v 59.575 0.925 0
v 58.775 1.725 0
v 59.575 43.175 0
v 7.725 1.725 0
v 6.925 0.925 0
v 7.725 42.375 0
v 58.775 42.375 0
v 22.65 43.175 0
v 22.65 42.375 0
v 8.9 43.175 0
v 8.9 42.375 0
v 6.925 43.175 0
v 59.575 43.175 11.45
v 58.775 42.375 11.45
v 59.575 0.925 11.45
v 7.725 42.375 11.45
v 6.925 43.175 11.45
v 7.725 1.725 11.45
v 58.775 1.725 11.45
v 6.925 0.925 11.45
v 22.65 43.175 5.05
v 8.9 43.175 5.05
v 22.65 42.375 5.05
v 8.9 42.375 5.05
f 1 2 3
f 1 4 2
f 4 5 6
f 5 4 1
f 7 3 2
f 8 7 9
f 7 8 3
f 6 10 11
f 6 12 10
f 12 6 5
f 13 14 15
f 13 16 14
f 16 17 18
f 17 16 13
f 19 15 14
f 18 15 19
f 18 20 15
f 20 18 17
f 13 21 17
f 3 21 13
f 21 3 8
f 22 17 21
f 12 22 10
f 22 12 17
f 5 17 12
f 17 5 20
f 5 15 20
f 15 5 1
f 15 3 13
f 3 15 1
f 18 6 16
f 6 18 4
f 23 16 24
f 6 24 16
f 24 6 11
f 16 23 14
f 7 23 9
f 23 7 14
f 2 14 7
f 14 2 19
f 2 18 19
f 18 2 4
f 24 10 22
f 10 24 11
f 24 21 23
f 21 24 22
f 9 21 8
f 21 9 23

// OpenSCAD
// file: measurements/print_settings.scad
/**
 * The diameter of the nozzle, in millimeters.  No features narrower than this can be produced.
 */
nozzle_diameter = 0.4;

/**
 * The height of a layer, in millimeters.  No features shorter than this can be produced.
 */
layer_height = 0.2;

/**
 * Added to small features to combat rounding errors.
 */
fudge = 0.00001;

/**
 * Cut out of any concave corners to prevent pinching.
 */
concave_corner_cut_size = 3;
// file: calculations/pcb.scad
include <../measurements/corner.scad>;
include <../measurements/pcb.scad>;
include <../measurements/wall.scad>;
include <wall.scad>;

/**
 * The location of the left edge of the PCB, in millimeters.
 */
pcb_left = corner_radius + wall_surround + wall_tolerance + wall_thickness + wall_tolerance + pcb_xy_tolerance;

/**
 * The location of the bottom edge of the PCB, in millimeters.
 */
pcb_bottom = wall_surround + wall_tolerance + wall_thickness + wall_tolerance + pcb_xy_tolerance;

/**
 * The locations of the PCB retainer corner cuts, on the X and Y axes, in millimeters.
 */
pcb_retainer_corner_cut_locations = [
  [
    pcb_left - pcb_xy_tolerance - pcb_retainer_thickness / 2,
    pcb_bottom - pcb_xy_tolerance - pcb_retainer_thickness / 2,
  ],
  [
    pcb_left + pcb_width + pcb_xy_tolerance + pcb_retainer_thickness / 2,
    pcb_bottom - pcb_xy_tolerance - pcb_retainer_thickness / 2,
  ],
  [
    pcb_left - pcb_xy_tolerance - pcb_retainer_thickness / 2,
    pcb_bottom + pcb_height + pcb_xy_tolerance + pcb_retainer_thickness / 2,
  ],
  [
    pcb_left + pcb_width + pcb_xy_tolerance + pcb_retainer_thickness / 2,
    pcb_bottom + pcb_height + pcb_xy_tolerance + pcb_retainer_thickness / 2,
  ],
];
// file: measurements/infrared.scad
/**
 * The distance between the left edge of the PCB and the left edge of the infrared window.
 */
infrared_pcb_left = 0.925;

/**
 * The width of the infrared window, in millimeters.
 */
infrared_width = 13.5;

/**
 * The tolerance either side of the infrared window, in millimeters.
 */
infrared_tolerance = 0.125;
// file: calculations/wall.scad
include <../measurements/print_settings.scad>;
include <../measurements/wall.scad>;

/**
 * The thickness of the wall, in millimeters.
 */
wall_thickness = wall_thickness_nozzle_diameters * nozzle_diameter + fudge;

/**
 * The minimum amount of plastic surrounding the wall-retaining grooves in the front and back faces, in millimeters.
 */
wall_surround = wall_surround_nozzle_diameters * nozzle_diameter + fudge;
// file: measurements/wall.scad
/**
 * The thickness of the wall, in nozzle diameters.
 */
wall_thickness_nozzle_diameters = 2;

/**
 * The amount of tolerance around the wall in the grooves in the front and back faces, in millimeters.
 */
wall_tolerance = 0.125;

/**
 * The minimum amount of plastic surrounding the wall-retaining grooves in the front and back faces, in nozzle diameters.
 */
wall_surround_nozzle_diameters = 2;

/**
 * The number of millimeters that the wall embeds into the front and back faces.
 */
wall_embed = 0.5;
// file: measurements/corner.scad
include <pcb.scad>;

/**
 * The radius of a corner, in millimeters.
 */
corner_radius = 6;

/**
 * The number of sides on a corner.
 */
corner_sides = 72;
// file: measurements/display.scad
/**
 * The distance between the left and right edges of the display's casing, in millimeters.
 */
display_width = 33.3;

/**
 * The distance between the top and bottom edges of the display's casing, in millimeters.
 */
display_height = 38.3;

/**
 * The distance between the (visible) front and (PCB-facing) back faces of the display's casing, ignoring the connector, in millimeters.
 */
display_thickness = 2;

/**
 * The distance between the left edge of the display's casing and the left edge of its viewable area, in millimeters.
 */
display_left_padding = 3.5;

/**
 * The distance between the right edge of the display's casing and the right edge of its viewable area, in millimeters.
 */
display_right_padding = 8.3;

/**
 * The distance between the top edge of the display's casing and the left top of its viewable area, in millimeters.
 */
display_top_padding = 4;

/**
 * The distance between the left edge of the display's casing and the bottom edge of its viewable area, in millimeters.
 */
display_bottom_padding = 4;

/**
 * The sizes of the radiuses of the corners of the shell's display cutout, in millimeters.
 */
display_radius_size = 2;

/**
 * The number of sides of each corner radius of the shell's display cutout.
 */
display_radius_sides = 16;

/**
 * The amount of margin on each side of the display's visible area, in millimeters; effectively expands the display by this amount in each direction.
 */
display_cutout_margin = 1;

/**
 * The amount of tolerance between each side of the display's casing and the retaining wall, in millimeters.
 */
display_xy_tolerance = 0.25;

/**
 * The thickness of the display retaining wall, in millimeters.
 */
display_wall_thickness = 0.6;

/**
 * The distance between the display's casing (ignoring the connector) and the PCB, in millimeters.
 */
display_pcb_distance = 2;

/**
 * The distance between the left edge of the display's casing and the left edge of the PCB, in millimeters.
 */
display_pcb_left = 0.8;

/**
 * The distance between the bottom edge of the display's casing and the bottom edge of the PCB, in millimeters.
 */
display_pcb_bottom = 0.8;

/**
 * The thickness of the front bezel, in millimeters.
 */
display_bezel_thickness = 1.4;

/**
 * The height of the display's connector.
 */
display_connector_height = 9;

/**
 * The width of the display's connector.
 */
display_connector_width = 1.45;

/**
 * The tolerance around the display's connector.
 */
display_connector_tolerance = 0.25;

/**
 * The distance between the right edge of the display and its connector.
 */
display_right_connector_right = 0.8;

/**
 * The distance between the bottom edge of the display and its connector.
 */
display_bottom_connector_bottom = 14.65;

/**
 * The thickness of the display's spacer.
 */
display_spacer_thickness = 1.2;
// file: modules/wall.scad
include <../measurements/infrared.scad>;
include <../measurements/pcb.scad>;
include <../measurements/wall.scad>;
include <../calculations/pcb.scad>;

module wall() {
  difference() {
    translate([
      pcb_left - pcb_xy_tolerance - wall_tolerance - wall_thickness,
      pcb_bottom - pcb_xy_tolerance - wall_tolerance - wall_thickness,
    ]) {
      square([
        wall_thickness + wall_tolerance + pcb_xy_tolerance + pcb_width + pcb_xy_tolerance + wall_tolerance + wall_thickness,
        wall_thickness + wall_tolerance + pcb_xy_tolerance + pcb_height + pcb_xy_tolerance + wall_tolerance + wall_thickness,
      ]);
    };

    translate([
      pcb_left - pcb_xy_tolerance - wall_tolerance,
      pcb_bottom - pcb_xy_tolerance - wall_tolerance,
    ]) {
      square([
        wall_tolerance + pcb_xy_tolerance + pcb_width + pcb_xy_tolerance + wall_tolerance,
        wall_tolerance + pcb_xy_tolerance + pcb_height + pcb_xy_tolerance + wall_tolerance,
      ]);
    };
  };
};
// file: modules/infrared_window_cutout.scad
include <../measurements/infrared.scad>;
include <../measurements/pcb.scad>;
include <../calculations/overall.scad>;
include <../calculations/pcb.scad>;

module infrared_window_cutout() {
  translate([
    pcb_left + infrared_pcb_left - infrared_tolerance,
    pcb_bottom + pcb_height / 2,
  ]) {
    square([infrared_width + infrared_tolerance * 2, overall_height]);
  };
}
// file: calculations/overall.scad
include <../measurements/corner.scad>;
include <../measurements/pcb.scad>;
include <../measurements/wall.scad>;
include <../measurements/display.scad>;
include <../measurements/plate.scad>;
include <wall.scad>;

/**
 * The width of the assembled device, in millimeters.
 */
overall_width = corner_radius + wall_surround + wall_tolerance + wall_thickness + wall_tolerance + pcb_xy_tolerance
  + pcb_width
  + pcb_xy_tolerance + wall_tolerance + wall_thickness + wall_tolerance + wall_surround + corner_radius;

/**
 * The height of the assembled device, in millimeters.
 */
overall_height = wall_surround + wall_tolerance + wall_thickness + wall_tolerance + pcb_xy_tolerance
  + pcb_height
  + pcb_xy_tolerance + wall_tolerance + wall_thickness + wall_tolerance + wall_surround;

/**
 * The depth of the assembled device, in millimeters.
 */
overall_depth = display_bezel_thickness + display_thickness + display_pcb_distance + pcb_z_tolerance + pcb_thickness + pcb_z_tolerance + pcb_back_clearance + display_bezel_thickness;

// TODO: circular dependency here

/**
 * The height of the wall, in millimeters.
 */
wall_height = overall_depth - plate_thickness * 2 + wall_embed * 2;
// file: calculations/button.scad
include <../measurements/button.scad>;
include <../measurements/display.scad>;
include <../measurements/pcb.scad>;

/**
 * The thickness of button caps, in millimeters.
 */
button_cap_thickness = display_bezel_thickness + display_thickness + display_pcb_distance + pcb_z_tolerance - button_height;
// file: measurements/plate.scad
/**
 * The thickness of the front and back plates, in millimeters.
 */
plate_thickness = 1.6;
// file: measurements/pcb.scad
/**
 * The distance between the left and right edges of the PCB, in millimeters.
 */
pcb_width = 50.3;

/**
 * The distance between the top and bottom edges of the PCB, in millimeters.
 */
pcb_height = 39.9;

/**
 * The thickness of the PCB, in millimeters.
 */
pcb_thickness = 1.6;

/**
 * The amount of tolerance between each side of the PCB's casing and the retaining wall, in millimeters.
 */
pcb_xy_tolerance = 0.25;

/**
 * The amount of tolerance above and below the PCB, in millimeters.
 */
pcb_z_tolerance = 0.125;

/**
 * The thickness of the PCB retaining wall, in millimeters.
 */
pcb_retainer_thickness = 0.6;

/**
 * The amount of clearance behind the PCB, in millimeters.
 */
pcb_back_clearance = 5;
// file: measurements/button.scad
/**
 * The locations of the buttons relative to the left and bottom edges of the PCB, in millimeters.
 */
button_locations_relative_to_pcb = [
  [44.52, 7.91],
  [44.52, 19.39],
  [44.52, 31.41],
];

/**
 * The distance between the surface of the PCB and the top of a button, in millimeters.
 */
button_height = 4.375;

/**
 * The number of sides of the stem atop the button.
 */
button_stem_sides = 36;

/**
 * The width and height of the column which supports a button from the back of the PCB.
 */
button_rear_support_size = 4.2;

/**
 * The corner radius of button caps.
 */
button_cap_radius = 1;

/**
 * The number of sides of the radius of button caps.
 */
button_cap_sides = 24;

/**
 * The space between a button cap and the surrounding shell.
 */
button_cap_gap = 0.5;

/**
 * The width of a sprue which holds a button cap in place.
 */
button_cap_sprue_width = 1.2;

/**
 * The thickness of a sprue which holds a button cap in place.
 */
button_cap_retainer_thickness = 0.4;

/**
 * Polygons defining the outlines of the button caps, relative to the left and bottom edges of the PCB, in millimeters.
 */
button_cap_polygons_relative_to_pcb = [
  [
    [41.52, 4.91],
    [41.52, 10.91],
    [47.52, 10.91],
    [47.52, 4.91],
  ],
  [
    [41.52, 16.39],
    [41.52, 22.39],
    [47.52, 22.39],
    [47.52, 16.39],
  ],
  [
    [41.52, 28.41],
    [41.52, 34.41],
    [47.52, 34.41],
    [47.52, 28.41],
  ],
];
// main file
include <measurements/button.scad>;
include <measurements/pcb.scad>;
include <measurements/plate.scad>;
include <calculations/button.scad>;
include <calculations/overall.scad>;
include <modules/infrared_window_cutout.scad>;
include <modules/wall.scad>;

difference() {
  linear_extrude(wall_height) {
    wall();
  };

  linear_extrude(wall_embed + pcb_back_clearance + button_cap_thickness - plate_thickness) {
    infrared_window_cutout();
  };
};
